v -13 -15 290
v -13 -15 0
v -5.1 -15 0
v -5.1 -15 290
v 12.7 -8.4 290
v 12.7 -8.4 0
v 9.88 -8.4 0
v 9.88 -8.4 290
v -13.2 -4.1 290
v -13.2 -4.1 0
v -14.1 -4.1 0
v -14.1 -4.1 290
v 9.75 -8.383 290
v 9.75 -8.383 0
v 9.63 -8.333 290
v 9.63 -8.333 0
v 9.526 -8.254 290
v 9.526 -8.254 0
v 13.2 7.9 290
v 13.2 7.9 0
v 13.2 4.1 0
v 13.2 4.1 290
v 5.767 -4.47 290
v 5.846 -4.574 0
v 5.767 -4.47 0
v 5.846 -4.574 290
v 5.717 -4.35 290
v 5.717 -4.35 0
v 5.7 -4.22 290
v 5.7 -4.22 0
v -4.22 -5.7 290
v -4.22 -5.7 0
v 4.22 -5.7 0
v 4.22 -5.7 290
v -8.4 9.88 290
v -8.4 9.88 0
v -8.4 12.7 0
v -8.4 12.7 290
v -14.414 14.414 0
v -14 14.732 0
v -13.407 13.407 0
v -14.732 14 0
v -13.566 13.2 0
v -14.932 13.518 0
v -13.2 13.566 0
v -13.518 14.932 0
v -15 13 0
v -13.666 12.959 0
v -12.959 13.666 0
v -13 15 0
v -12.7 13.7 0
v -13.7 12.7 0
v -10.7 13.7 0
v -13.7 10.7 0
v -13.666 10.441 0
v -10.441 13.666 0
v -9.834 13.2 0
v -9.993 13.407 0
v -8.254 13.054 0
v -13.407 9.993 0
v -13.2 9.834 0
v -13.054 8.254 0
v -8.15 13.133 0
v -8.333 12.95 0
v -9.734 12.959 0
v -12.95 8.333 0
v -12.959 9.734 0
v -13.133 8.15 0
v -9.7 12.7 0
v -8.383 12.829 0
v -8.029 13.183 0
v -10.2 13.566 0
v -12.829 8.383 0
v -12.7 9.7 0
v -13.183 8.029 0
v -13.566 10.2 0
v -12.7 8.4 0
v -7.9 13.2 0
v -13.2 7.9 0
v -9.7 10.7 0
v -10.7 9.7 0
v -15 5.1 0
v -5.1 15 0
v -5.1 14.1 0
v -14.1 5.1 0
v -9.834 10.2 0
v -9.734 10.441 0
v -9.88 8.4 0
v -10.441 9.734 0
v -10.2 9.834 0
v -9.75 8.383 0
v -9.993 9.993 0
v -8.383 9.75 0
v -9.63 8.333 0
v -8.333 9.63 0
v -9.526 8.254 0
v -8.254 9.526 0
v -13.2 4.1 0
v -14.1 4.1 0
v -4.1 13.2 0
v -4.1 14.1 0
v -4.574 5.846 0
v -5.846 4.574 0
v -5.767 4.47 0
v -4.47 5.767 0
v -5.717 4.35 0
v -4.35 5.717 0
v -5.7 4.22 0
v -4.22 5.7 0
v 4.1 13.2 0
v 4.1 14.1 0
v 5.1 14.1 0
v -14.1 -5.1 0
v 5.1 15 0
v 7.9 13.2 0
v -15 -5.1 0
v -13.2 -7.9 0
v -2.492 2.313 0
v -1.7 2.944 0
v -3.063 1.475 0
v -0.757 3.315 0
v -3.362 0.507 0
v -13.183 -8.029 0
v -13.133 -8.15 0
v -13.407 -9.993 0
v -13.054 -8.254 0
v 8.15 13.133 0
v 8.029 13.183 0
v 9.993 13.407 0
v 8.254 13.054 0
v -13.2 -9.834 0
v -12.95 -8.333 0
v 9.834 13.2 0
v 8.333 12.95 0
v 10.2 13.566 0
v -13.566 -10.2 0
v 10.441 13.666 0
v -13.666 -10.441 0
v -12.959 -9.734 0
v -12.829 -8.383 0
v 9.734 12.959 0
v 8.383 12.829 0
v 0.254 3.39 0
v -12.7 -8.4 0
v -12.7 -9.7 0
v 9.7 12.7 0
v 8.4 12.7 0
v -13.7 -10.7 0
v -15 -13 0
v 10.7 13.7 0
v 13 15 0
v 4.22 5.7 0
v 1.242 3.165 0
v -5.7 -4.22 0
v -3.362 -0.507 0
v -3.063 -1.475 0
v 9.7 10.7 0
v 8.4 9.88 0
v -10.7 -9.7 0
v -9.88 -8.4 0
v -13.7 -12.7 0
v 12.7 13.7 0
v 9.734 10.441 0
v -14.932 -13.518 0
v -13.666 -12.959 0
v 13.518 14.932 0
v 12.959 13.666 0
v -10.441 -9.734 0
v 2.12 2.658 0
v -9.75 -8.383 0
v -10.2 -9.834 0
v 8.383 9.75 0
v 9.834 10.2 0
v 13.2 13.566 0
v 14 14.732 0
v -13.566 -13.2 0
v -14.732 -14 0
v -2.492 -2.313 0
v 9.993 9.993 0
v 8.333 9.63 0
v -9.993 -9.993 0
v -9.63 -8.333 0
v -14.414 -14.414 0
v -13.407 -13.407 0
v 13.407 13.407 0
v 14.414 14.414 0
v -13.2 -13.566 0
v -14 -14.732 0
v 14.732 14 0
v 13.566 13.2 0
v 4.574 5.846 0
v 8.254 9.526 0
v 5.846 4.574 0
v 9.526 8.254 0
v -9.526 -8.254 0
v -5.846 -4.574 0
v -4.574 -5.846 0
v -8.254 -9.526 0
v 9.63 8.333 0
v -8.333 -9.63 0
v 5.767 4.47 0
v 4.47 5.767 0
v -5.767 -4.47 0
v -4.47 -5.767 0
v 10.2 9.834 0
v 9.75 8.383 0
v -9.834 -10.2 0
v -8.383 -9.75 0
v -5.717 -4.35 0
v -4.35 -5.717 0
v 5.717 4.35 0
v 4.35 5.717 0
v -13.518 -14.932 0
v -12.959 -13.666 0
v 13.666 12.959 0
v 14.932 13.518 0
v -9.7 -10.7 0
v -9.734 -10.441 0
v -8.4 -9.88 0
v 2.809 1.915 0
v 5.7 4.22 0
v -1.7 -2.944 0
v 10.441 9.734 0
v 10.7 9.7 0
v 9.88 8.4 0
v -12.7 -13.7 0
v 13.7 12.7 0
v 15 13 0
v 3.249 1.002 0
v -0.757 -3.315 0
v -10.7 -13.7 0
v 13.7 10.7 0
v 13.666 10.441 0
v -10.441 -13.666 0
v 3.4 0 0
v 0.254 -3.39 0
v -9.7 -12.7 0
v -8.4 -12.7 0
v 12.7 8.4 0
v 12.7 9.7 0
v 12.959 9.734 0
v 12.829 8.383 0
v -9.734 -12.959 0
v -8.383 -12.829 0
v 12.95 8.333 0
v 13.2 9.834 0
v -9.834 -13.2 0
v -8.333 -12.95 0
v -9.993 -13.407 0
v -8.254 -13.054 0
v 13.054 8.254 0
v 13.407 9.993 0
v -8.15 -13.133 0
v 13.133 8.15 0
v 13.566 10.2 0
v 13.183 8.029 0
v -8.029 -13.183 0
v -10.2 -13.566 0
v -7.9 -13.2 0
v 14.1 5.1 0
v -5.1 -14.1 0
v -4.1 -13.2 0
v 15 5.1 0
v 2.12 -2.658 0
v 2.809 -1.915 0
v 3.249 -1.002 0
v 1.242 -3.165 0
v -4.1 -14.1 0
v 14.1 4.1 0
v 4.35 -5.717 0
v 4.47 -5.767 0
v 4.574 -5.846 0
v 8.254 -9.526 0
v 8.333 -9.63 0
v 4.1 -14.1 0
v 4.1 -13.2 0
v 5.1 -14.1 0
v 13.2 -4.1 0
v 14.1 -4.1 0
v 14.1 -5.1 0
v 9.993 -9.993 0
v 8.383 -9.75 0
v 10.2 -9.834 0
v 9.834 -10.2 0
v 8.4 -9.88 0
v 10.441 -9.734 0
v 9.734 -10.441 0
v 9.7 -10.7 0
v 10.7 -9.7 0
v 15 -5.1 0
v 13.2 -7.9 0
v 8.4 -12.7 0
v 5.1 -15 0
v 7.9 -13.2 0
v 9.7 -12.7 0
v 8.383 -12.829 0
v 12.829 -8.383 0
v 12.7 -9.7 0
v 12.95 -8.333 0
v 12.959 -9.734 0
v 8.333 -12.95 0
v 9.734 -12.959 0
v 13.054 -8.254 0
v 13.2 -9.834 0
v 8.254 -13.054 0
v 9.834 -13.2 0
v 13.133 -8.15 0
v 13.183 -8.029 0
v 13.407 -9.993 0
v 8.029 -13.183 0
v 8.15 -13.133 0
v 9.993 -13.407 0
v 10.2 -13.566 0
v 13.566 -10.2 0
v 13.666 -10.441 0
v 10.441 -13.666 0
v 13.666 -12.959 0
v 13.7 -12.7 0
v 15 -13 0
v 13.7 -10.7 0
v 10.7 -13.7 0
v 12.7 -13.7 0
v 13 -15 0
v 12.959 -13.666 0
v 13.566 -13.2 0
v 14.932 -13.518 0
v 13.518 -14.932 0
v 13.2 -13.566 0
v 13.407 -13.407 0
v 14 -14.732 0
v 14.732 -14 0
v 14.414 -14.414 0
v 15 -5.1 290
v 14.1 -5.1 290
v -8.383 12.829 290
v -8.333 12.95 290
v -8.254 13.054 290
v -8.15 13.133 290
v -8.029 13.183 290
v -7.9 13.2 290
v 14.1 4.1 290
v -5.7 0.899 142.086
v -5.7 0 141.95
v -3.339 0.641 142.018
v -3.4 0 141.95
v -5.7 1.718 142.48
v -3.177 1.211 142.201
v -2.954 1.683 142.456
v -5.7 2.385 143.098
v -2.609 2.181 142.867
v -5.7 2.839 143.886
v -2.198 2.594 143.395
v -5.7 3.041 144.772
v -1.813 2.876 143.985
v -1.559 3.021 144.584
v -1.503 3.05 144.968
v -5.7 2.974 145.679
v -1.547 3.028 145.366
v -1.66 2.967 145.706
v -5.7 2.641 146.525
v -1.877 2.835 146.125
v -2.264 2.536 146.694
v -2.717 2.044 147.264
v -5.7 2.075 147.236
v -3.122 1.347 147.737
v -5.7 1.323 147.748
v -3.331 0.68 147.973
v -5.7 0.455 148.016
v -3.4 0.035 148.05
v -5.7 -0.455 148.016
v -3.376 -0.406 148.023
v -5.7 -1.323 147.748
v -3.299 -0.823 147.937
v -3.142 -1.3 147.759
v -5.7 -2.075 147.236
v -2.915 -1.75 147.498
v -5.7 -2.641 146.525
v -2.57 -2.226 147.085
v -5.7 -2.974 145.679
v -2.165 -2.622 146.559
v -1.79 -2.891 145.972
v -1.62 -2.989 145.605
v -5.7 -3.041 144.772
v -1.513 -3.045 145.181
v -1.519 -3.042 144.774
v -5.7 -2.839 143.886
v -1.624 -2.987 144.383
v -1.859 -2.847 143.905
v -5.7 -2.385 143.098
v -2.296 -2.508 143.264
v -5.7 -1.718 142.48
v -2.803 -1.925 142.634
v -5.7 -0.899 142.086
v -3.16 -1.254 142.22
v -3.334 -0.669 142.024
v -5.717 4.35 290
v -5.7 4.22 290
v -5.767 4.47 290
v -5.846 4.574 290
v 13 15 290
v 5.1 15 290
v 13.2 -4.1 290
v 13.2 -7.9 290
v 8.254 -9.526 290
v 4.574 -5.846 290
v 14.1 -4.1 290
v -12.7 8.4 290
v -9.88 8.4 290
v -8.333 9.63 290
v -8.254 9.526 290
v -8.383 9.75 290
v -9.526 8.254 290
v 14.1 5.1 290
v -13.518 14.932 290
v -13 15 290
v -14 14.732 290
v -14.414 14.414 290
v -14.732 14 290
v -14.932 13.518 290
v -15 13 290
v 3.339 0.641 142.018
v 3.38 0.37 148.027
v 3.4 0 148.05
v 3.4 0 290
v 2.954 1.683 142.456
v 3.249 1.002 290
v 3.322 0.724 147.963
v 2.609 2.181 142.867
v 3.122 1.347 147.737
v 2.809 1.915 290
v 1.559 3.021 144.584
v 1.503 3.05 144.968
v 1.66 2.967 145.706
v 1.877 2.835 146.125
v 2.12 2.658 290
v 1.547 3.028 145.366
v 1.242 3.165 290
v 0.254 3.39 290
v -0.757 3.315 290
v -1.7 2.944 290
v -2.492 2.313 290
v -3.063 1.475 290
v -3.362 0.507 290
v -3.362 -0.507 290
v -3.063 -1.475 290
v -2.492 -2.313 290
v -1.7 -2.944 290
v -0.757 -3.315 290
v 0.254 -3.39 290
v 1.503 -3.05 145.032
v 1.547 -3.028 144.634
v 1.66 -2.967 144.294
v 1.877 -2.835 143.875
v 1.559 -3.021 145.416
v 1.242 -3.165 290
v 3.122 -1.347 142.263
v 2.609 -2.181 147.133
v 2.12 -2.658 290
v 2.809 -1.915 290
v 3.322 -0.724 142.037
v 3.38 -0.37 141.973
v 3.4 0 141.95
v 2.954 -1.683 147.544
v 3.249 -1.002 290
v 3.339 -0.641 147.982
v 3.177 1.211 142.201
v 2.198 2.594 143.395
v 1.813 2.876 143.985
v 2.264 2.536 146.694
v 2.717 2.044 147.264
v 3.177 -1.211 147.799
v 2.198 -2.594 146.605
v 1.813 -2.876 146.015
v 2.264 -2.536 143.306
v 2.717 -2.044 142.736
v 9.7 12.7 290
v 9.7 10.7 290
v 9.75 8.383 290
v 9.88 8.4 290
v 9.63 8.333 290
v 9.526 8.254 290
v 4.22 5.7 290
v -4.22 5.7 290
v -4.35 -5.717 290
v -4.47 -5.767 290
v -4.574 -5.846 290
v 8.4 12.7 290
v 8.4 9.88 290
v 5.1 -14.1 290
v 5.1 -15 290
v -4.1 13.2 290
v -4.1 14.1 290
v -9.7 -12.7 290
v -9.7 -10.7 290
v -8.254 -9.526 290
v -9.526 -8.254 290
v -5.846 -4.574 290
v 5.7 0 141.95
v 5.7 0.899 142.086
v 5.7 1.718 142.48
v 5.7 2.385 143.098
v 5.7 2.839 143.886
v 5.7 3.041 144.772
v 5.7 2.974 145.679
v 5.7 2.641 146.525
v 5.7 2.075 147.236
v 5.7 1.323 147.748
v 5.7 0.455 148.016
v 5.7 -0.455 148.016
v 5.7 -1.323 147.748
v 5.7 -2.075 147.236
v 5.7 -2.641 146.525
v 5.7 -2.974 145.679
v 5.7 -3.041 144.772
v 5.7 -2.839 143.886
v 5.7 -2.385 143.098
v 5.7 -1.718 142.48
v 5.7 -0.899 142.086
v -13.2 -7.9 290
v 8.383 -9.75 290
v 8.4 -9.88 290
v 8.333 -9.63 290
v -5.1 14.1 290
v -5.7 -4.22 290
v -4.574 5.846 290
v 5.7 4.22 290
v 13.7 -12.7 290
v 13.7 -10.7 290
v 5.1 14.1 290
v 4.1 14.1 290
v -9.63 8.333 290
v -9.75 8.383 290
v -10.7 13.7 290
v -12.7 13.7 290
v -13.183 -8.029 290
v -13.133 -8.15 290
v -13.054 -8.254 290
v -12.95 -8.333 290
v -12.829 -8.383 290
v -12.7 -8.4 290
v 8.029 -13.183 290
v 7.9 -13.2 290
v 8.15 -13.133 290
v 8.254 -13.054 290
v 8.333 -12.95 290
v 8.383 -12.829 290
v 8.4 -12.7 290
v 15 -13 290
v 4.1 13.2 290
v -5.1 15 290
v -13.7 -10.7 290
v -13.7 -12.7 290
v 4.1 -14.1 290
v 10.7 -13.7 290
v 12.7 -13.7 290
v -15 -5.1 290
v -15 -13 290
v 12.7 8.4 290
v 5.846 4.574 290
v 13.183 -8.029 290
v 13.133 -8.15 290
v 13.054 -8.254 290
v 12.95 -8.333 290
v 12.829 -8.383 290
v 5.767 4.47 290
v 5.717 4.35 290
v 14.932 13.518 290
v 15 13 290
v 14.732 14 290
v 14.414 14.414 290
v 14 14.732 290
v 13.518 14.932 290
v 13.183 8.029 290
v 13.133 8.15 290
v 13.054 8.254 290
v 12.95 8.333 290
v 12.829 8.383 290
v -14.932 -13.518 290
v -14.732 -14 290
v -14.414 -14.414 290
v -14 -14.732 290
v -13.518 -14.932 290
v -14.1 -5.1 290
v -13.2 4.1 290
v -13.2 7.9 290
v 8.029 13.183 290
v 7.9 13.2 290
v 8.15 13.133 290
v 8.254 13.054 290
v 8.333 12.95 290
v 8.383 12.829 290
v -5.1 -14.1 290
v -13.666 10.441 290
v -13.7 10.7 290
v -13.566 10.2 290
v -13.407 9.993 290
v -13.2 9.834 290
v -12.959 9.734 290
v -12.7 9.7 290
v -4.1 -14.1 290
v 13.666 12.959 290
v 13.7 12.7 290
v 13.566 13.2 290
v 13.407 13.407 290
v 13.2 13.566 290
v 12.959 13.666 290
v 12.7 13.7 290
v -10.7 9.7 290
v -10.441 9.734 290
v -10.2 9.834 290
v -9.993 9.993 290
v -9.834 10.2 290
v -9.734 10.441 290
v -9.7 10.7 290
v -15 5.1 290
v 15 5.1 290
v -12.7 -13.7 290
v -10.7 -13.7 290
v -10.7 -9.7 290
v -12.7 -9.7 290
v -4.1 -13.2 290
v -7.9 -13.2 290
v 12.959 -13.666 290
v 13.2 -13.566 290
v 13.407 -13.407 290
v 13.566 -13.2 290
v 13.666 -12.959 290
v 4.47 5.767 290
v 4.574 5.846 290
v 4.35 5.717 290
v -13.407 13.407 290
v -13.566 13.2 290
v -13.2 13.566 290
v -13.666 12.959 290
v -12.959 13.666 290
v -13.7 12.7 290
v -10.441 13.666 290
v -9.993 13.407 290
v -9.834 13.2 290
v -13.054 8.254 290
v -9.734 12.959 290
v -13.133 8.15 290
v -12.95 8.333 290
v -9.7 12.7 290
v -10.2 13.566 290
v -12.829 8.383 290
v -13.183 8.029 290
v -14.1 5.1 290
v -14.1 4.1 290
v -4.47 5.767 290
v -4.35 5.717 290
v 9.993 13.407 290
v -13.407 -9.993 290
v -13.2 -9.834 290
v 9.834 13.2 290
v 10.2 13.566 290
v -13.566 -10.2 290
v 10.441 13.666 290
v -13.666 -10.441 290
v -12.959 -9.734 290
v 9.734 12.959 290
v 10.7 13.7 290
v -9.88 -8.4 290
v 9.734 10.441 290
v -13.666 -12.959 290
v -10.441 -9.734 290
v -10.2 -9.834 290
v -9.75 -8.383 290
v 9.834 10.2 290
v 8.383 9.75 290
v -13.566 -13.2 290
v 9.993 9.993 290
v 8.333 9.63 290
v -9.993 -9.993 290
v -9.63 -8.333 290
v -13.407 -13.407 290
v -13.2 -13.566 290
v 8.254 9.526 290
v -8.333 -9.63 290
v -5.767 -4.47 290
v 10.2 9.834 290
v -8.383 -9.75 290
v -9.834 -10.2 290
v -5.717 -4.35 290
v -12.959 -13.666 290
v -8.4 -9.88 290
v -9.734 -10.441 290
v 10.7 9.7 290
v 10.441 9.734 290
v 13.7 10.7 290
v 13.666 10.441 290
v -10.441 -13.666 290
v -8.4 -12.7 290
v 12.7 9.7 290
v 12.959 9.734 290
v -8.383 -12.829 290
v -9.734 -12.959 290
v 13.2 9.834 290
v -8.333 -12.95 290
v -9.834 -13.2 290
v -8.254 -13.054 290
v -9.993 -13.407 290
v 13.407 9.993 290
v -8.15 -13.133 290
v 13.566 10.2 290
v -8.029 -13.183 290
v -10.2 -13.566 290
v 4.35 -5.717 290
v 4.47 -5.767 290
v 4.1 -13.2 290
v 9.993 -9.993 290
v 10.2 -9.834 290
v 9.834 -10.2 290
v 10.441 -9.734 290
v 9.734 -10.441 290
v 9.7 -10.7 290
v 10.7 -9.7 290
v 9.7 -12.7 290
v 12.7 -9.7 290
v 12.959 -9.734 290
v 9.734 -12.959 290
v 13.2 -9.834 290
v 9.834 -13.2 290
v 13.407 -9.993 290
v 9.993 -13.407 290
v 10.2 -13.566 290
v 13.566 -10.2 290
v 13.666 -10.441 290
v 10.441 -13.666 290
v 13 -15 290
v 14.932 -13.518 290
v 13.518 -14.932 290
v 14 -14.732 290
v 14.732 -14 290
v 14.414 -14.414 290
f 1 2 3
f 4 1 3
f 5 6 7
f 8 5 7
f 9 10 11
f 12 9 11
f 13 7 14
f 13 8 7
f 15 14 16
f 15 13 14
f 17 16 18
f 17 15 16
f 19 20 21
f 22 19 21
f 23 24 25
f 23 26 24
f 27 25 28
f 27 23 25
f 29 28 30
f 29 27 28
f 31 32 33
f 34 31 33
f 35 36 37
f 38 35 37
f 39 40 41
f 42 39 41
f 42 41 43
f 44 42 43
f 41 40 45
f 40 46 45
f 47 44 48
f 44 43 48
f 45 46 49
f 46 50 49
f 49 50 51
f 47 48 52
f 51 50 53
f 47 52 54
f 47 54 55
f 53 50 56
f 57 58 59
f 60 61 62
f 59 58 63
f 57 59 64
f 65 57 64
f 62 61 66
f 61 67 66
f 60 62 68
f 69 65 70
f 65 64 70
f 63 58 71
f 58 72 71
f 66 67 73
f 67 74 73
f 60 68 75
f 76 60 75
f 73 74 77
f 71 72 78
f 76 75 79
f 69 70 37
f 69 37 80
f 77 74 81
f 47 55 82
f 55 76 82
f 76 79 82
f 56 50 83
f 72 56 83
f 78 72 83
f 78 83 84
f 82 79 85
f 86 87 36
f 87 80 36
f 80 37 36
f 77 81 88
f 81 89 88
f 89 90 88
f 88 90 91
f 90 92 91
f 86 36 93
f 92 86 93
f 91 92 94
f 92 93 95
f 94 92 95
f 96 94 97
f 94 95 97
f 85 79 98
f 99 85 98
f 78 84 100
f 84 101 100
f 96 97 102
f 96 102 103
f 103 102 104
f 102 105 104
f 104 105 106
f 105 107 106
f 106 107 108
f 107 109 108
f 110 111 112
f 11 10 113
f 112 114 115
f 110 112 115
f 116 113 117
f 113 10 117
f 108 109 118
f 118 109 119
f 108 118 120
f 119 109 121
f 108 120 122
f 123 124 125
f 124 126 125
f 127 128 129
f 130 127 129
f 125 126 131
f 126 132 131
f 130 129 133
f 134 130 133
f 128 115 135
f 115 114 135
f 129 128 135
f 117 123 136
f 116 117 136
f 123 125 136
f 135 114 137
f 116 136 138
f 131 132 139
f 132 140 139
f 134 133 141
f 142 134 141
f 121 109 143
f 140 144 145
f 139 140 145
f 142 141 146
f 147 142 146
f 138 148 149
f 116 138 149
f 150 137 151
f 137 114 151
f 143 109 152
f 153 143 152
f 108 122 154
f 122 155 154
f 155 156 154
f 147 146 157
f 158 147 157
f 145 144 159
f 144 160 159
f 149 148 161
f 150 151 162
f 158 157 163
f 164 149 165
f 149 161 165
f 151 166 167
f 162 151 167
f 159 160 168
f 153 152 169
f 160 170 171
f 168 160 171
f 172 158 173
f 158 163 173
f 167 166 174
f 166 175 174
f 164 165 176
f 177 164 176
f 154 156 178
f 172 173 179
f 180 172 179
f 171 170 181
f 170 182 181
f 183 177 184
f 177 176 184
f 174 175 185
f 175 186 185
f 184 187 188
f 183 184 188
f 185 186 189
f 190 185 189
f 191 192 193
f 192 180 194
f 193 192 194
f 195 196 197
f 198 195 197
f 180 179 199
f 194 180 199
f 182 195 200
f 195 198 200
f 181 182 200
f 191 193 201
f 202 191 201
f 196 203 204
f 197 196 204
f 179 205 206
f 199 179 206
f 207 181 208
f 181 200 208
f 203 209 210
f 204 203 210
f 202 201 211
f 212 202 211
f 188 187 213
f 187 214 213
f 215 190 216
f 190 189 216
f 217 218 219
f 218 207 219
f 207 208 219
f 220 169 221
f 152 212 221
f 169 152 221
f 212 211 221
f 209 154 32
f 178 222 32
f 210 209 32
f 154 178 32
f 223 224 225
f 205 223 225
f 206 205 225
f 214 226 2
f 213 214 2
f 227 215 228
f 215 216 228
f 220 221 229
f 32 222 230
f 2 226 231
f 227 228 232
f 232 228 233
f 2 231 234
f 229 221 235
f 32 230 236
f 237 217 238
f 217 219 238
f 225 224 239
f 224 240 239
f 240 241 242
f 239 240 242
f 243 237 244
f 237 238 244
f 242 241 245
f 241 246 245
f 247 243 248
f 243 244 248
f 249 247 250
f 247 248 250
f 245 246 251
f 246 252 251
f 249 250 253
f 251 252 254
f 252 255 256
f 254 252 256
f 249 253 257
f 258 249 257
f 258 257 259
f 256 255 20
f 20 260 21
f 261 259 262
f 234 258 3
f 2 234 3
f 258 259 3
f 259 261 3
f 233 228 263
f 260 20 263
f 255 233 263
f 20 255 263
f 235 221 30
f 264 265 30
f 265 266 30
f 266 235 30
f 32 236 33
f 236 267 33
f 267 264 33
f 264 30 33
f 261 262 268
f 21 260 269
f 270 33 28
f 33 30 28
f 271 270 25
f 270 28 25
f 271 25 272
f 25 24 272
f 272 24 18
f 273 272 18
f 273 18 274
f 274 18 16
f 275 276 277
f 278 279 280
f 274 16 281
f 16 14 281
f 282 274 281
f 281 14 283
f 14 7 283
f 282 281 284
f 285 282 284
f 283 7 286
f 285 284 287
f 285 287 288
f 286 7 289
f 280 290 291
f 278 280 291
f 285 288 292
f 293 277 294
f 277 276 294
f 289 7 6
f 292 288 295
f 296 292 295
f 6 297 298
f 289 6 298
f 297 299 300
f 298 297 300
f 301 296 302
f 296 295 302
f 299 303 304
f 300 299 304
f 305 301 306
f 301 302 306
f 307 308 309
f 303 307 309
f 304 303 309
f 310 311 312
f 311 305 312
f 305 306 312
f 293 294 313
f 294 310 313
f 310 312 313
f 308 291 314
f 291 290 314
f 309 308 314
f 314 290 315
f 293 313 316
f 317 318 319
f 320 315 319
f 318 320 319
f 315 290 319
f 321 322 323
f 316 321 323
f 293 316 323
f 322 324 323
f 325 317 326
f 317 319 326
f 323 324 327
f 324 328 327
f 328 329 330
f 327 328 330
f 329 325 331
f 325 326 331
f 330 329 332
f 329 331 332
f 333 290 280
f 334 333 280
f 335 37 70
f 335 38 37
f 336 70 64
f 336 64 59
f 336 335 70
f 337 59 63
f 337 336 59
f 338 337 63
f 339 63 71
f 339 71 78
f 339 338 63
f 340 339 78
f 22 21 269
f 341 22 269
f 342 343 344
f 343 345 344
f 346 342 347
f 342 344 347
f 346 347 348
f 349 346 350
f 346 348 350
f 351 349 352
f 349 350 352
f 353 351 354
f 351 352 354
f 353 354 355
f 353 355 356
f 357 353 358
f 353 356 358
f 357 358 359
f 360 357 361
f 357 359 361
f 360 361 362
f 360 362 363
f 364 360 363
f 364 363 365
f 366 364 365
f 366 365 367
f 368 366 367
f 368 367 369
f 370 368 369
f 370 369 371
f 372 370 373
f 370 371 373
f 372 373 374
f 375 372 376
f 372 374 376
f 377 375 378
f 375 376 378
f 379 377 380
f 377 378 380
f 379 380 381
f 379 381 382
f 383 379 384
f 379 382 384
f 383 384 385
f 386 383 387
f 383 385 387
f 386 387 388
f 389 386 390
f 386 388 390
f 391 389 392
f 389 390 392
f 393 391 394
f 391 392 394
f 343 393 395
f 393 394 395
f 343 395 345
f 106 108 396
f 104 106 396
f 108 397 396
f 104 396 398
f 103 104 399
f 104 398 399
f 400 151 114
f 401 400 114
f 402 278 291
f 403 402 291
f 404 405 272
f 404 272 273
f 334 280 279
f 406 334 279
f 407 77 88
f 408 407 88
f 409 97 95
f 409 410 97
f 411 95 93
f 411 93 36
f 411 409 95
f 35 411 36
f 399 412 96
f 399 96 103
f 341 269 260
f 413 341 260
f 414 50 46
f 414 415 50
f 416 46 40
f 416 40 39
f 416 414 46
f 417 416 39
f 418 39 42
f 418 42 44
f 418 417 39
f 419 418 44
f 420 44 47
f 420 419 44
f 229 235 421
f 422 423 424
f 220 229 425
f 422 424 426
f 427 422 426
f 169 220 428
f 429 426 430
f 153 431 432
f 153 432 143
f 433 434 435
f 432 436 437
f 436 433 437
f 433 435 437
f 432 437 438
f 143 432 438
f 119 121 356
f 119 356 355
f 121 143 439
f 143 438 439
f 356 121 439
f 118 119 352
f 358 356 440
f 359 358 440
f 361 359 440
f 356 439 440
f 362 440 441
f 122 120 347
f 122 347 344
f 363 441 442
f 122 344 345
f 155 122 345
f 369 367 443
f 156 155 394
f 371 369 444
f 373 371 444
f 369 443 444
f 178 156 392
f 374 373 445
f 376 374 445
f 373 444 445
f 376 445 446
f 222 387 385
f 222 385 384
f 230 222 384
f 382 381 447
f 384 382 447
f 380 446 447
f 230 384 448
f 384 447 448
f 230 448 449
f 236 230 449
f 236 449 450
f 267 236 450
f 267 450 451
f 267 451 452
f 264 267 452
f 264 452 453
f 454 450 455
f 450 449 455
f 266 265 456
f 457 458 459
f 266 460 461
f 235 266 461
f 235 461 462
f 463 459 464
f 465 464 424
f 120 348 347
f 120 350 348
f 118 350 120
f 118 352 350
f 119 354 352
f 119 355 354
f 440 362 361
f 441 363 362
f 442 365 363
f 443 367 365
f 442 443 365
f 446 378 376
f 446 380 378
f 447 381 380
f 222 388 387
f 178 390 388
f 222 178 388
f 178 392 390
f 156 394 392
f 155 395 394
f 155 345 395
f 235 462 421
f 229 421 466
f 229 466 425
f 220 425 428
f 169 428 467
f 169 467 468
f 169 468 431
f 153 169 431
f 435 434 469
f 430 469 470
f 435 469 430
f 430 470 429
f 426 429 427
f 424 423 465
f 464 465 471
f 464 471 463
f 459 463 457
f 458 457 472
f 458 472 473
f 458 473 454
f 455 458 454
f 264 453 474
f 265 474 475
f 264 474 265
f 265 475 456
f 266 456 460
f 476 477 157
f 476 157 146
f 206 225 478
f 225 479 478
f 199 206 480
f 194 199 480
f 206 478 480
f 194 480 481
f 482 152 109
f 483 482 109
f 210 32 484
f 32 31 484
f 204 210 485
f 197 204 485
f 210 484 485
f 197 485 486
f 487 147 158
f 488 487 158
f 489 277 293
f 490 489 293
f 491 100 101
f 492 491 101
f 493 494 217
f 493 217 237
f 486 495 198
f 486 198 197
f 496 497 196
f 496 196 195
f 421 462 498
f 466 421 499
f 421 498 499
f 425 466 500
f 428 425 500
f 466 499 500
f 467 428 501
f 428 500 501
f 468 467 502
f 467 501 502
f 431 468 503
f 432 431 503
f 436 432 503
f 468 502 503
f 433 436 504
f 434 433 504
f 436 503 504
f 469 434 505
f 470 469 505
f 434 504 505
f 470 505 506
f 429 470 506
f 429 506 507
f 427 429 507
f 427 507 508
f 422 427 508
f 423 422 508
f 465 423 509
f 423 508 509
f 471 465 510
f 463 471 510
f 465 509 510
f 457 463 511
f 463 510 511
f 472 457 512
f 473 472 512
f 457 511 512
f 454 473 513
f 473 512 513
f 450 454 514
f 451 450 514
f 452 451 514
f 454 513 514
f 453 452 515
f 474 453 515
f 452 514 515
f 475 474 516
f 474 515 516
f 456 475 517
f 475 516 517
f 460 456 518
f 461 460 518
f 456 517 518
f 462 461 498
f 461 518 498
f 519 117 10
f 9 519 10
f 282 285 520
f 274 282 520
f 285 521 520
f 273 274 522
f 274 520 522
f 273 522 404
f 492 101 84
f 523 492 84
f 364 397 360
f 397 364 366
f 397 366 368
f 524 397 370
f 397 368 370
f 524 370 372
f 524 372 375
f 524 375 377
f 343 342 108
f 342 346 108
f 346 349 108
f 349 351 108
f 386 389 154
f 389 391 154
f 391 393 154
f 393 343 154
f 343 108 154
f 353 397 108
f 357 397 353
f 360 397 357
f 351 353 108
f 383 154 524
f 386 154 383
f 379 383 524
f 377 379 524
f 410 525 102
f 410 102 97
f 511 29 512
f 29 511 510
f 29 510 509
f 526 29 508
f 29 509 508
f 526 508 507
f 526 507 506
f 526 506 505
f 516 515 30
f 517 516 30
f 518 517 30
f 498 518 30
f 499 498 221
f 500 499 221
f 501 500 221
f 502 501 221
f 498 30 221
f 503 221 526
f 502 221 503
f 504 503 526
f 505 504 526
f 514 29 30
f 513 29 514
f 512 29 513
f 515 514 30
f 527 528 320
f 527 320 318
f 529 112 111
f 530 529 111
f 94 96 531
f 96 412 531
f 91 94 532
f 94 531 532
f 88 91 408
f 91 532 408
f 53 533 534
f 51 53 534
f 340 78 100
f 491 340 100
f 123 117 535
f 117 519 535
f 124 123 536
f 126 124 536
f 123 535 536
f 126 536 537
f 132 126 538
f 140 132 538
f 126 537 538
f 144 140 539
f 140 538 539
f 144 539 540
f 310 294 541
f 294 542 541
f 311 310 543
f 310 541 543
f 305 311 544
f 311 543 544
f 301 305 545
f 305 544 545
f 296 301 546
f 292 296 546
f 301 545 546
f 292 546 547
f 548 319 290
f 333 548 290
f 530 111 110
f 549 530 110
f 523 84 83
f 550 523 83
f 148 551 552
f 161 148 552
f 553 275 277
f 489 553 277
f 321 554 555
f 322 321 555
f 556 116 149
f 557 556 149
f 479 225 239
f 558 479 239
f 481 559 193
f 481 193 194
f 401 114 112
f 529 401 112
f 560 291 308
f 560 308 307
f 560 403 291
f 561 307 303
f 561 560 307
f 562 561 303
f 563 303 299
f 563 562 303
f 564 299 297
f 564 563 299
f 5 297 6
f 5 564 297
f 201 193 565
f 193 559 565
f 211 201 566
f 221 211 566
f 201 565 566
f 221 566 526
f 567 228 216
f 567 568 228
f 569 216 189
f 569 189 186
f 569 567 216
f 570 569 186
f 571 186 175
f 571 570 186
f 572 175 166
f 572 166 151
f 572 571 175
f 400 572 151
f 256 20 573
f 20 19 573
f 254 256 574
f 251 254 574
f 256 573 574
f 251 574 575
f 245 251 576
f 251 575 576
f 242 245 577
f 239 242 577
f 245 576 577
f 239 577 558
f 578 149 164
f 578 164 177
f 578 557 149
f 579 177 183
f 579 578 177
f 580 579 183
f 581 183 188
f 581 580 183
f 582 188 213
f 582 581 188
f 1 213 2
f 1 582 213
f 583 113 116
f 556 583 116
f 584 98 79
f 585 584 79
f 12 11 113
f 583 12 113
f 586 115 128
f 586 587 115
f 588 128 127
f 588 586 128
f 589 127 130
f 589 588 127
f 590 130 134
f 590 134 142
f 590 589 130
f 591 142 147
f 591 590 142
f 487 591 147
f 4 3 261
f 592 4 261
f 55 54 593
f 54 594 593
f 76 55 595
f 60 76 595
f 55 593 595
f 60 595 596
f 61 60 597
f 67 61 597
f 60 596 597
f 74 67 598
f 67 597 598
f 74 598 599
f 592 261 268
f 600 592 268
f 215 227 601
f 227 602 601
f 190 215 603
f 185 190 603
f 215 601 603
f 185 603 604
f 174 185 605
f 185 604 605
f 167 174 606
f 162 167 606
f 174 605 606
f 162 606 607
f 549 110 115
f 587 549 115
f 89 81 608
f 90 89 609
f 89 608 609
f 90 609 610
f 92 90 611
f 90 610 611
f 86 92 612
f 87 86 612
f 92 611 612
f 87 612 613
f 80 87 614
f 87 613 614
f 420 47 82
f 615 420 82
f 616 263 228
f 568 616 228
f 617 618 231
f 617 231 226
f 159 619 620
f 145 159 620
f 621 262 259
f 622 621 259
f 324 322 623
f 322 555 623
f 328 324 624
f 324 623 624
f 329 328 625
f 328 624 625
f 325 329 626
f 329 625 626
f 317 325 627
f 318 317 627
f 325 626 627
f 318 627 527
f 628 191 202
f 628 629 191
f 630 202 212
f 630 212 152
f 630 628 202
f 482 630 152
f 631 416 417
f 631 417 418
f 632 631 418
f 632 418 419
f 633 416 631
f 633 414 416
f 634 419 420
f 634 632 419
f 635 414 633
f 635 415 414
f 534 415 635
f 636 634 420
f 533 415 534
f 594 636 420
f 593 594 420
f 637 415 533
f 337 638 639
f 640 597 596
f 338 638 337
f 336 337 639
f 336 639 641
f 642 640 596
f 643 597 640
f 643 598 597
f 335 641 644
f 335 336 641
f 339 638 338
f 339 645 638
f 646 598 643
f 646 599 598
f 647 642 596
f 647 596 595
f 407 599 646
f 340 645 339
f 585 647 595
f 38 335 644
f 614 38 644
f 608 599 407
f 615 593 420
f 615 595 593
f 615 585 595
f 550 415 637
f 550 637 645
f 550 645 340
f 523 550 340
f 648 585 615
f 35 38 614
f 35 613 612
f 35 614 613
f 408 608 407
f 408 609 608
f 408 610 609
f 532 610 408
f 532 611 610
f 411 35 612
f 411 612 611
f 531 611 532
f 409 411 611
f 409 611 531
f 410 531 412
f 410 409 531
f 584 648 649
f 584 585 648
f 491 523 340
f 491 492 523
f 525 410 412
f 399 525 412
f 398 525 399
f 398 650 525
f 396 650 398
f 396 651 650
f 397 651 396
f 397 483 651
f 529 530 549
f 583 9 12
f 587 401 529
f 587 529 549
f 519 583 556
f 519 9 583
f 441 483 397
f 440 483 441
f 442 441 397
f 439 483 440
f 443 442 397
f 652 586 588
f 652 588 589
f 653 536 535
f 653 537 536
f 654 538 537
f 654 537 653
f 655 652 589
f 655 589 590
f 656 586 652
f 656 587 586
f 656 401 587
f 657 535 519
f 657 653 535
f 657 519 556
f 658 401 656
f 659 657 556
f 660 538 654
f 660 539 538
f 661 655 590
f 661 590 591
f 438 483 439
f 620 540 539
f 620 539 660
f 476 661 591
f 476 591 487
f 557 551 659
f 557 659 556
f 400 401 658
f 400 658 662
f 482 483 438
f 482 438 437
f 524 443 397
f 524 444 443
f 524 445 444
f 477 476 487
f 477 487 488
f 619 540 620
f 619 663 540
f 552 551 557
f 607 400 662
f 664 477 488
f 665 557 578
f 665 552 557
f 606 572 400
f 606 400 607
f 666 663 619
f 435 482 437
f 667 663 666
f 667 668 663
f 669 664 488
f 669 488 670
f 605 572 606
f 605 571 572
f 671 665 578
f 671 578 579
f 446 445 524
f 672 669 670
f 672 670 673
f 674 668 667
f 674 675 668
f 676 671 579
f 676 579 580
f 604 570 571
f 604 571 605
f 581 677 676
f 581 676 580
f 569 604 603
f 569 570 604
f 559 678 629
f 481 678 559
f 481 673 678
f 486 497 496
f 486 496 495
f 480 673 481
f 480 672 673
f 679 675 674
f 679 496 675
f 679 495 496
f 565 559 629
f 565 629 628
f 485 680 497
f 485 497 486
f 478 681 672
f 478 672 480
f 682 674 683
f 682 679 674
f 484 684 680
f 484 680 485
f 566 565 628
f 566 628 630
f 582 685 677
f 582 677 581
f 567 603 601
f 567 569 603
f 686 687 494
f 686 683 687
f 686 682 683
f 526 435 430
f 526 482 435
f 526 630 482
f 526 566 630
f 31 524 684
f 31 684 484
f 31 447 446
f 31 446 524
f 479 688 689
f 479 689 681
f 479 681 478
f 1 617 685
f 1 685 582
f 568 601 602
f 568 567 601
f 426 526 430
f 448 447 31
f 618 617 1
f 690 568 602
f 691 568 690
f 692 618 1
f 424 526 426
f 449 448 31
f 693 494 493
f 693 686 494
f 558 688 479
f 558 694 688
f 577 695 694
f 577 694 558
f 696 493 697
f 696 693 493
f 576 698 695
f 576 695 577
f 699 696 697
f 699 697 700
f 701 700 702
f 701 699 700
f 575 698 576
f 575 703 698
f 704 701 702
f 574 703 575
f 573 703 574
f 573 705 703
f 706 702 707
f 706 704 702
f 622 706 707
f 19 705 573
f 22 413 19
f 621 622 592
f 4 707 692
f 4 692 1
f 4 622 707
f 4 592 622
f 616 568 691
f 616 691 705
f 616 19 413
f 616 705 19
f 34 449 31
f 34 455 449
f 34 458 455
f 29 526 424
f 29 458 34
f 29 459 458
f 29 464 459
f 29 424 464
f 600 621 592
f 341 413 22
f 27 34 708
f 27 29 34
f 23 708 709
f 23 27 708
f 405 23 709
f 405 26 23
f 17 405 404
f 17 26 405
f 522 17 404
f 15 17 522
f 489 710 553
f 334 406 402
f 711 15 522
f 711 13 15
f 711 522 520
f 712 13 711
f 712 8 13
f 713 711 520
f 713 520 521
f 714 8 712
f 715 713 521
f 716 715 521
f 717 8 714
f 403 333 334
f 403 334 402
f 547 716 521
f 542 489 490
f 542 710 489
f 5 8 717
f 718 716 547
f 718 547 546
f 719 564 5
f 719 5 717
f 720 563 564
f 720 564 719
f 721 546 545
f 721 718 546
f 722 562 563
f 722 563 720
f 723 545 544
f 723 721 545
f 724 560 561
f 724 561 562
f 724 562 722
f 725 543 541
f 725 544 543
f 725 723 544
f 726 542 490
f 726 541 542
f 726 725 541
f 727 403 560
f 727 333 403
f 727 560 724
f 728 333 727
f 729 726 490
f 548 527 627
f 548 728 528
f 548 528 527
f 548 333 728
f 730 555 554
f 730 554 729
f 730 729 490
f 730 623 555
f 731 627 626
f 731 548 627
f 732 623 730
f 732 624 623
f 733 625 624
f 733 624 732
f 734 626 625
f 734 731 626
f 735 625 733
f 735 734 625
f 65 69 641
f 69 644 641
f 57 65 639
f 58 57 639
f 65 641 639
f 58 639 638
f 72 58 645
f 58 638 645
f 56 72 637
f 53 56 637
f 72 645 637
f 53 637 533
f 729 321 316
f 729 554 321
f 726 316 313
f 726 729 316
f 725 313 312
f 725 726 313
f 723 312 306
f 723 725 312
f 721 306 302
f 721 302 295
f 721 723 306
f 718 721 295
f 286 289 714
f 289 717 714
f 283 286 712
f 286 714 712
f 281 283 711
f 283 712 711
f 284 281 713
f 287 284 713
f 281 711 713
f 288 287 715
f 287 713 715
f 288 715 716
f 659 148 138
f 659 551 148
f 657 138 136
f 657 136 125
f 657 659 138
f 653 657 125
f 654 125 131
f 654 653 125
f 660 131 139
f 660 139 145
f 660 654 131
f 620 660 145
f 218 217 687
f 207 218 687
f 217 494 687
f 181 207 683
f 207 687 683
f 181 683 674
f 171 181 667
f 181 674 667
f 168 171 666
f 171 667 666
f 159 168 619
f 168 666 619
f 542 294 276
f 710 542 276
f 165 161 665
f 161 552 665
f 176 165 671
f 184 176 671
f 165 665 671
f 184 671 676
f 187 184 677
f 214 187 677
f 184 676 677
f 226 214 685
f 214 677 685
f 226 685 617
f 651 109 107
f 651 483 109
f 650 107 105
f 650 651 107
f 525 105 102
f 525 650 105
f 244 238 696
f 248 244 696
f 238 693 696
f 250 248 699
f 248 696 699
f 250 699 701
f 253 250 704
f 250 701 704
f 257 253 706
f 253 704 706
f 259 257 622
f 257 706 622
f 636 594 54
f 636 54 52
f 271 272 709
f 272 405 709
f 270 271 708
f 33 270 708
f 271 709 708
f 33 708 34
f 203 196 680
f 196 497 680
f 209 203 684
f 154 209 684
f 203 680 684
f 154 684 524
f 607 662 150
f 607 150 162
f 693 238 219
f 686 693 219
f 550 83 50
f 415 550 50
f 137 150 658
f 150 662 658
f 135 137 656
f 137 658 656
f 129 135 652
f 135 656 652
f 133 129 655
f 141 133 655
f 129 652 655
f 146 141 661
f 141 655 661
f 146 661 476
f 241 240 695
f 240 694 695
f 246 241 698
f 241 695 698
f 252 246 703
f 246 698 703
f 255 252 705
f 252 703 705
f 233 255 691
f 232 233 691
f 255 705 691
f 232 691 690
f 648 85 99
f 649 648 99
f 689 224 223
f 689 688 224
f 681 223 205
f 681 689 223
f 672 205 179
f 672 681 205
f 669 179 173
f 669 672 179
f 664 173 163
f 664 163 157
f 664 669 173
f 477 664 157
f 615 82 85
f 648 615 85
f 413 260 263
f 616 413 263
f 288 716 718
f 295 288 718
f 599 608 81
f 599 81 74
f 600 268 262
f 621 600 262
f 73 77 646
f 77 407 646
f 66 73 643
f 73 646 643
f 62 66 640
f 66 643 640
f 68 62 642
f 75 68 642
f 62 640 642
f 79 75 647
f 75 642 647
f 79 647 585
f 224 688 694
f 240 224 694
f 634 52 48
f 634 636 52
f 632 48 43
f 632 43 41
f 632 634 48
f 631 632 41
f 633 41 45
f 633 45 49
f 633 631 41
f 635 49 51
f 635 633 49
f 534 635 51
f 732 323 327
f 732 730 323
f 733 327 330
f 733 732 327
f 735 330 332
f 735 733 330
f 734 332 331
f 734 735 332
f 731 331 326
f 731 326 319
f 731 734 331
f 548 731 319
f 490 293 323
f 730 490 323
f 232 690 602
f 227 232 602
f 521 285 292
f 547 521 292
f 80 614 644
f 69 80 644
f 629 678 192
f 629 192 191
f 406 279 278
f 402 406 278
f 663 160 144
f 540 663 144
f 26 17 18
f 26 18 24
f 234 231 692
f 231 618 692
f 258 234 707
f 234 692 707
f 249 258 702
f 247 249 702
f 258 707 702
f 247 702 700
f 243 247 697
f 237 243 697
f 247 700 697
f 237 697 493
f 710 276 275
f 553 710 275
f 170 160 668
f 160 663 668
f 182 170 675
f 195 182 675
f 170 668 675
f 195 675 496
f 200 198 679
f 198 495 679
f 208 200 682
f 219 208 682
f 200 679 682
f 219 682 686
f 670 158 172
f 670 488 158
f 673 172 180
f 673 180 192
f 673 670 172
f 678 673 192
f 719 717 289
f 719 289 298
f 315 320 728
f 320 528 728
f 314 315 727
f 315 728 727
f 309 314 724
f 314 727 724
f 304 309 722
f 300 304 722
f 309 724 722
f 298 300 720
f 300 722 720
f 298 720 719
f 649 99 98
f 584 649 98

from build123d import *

# Parameters (mm, degrees)
SKETCH_1_W                       = 4
SKETCH_1_H                       = 4
EXTRUDE_1_DEPTH                  = 290
FILLET_1_R                       = 1
FILLET_2_R                       = 2
FILLET_3_R                       = 0.5
PATTERN_CIRCULAR_1_COUNT         = 4
FILLET_1_OF_PATTERN_CIRCULAR_1_R = 1
FILLET_2_OF_PATTERN_CIRCULAR_1_R = 2
FILLET_3_OF_PATTERN_CIRCULAR_1_R = 0.5
SKETCH_2_R                       = 3.4
CUT_EXTRUDE_1_DEPTH              = 291
SKETCH_3_R                       = 3.05
CUT_EXTRUDE_2_DEPTH              = 10


with BuildPart() as part:
    # 草图1 → 凸台-拉伸1 (new body)
    with BuildSketch(Plane.XY):
        Polygon((5.7, 0), (5.7, 4.427207794), (9.672792206, 8.4), (13.2, 8.4), (13.2, 4.1), (14.1, 4.1), (14.1, 5.1), (15, 5.1), (15, 15), (5.1, 15), (5.1, 14.1), (4.1, 14.1), (4.1, 13.2), (8.4, 13.2), (8.4, 9.672792206), (4.427207794, 5.7), (0, 5.7), (0, 0), align=None)
        with Locations((11.7, 11.7)):
            Rectangle(SKETCH_1_W, SKETCH_1_H, mode=Mode.SUBTRACT)
    extrude_1 = extrude(amount=EXTRUDE_1_DEPTH)

    # 圆角1
    fillet_1_edges = [part.edges().sort_by_distance(p)[0] for p in [
        (13.7, 9.7, 145),
        (13.7, 13.7, 145),
        (9.7, 13.7, 145),
        (9.7, 9.7, 145),
    ]]
    fillet(fillet_1_edges, radius=FILLET_1_R)

    # 圆角2
    fillet_2_edges = [part.edges().sort_by_distance(p)[0] for p in [
        (15, 15, 145),
    ]]
    fillet(fillet_2_edges, radius=FILLET_2_R)

    # 圆角3
    fillet_3_edges = [part.edges().sort_by_distance(p)[0] for p in [
        (4.427207794, 5.7, 145),
        (8.4, 9.672792206, 145),
        (8.4, 13.2, 145),
        (13.2, 8.4, 145),
        (9.672792206, 8.4, 145),
        (5.7, 4.427207794, 145),
    ]]
    fillet(fillet_3_edges, radius=FILLET_3_R)

    # 阵列(圆周)1: 凸台-拉伸1 ×4 about axis
    pattern_circular_1_axis = Axis((0, 0, 0), (0, 0, 1))
    for i in range(1, PATTERN_CIRCULAR_1_COUNT):
        add(extrude_1.rotate(pattern_circular_1_axis, i * 360 / PATTERN_CIRCULAR_1_COUNT))

    # 圆角1 of 阵列(圆周)1
    fillet_1_of_pattern_circular_1_edges = [part.edges().sort_by_distance(p)[0] for p in [
        (-9.7, 13.7, 145),
        (-13.7, 13.7, 145),
        (-13.7, 9.7, 145),
        (-9.7, 9.7, 145),
        (-13.7, -9.7, 145),
        (-13.7, -13.7, 145),
        (-9.7, -13.7, 145),
        (-9.7, -9.7, 145),
        (9.7, -13.7, 145),
        (13.7, -13.7, 145),
        (13.7, -9.7, 145),
        (9.7, -9.7, 145),
    ]]
    fillet(fillet_1_of_pattern_circular_1_edges, radius=FILLET_1_OF_PATTERN_CIRCULAR_1_R)

    # 圆角2 of 阵列(圆周)1
    fillet_2_of_pattern_circular_1_edges = [part.edges().sort_by_distance(p)[0] for p in [
        (-15, 15, 145),
        (-15, -15, 145),
        (15, -15, 145),
    ]]
    fillet(fillet_2_of_pattern_circular_1_edges, radius=FILLET_2_OF_PATTERN_CIRCULAR_1_R)

    # 圆角3 of 阵列(圆周)1
    fillet_3_of_pattern_circular_1_edges = [part.edges().sort_by_distance(p)[0] for p in [
        (-5.7, 4.427207794, 145),
        (-9.672792206, 8.4, 145),
        (-13.2, 8.4, 145),
        (-8.4, 13.2, 145),
        (-8.4, 9.672792206, 145),
        (-4.427207794, 5.7, 145),
        (-4.427207794, -5.7, 145),
        (-8.4, -9.672792206, 145),
        (-8.4, -13.2, 145),
        (-13.2, -8.4, 145),
        (-9.672792206, -8.4, 145),
        (-5.7, -4.427207794, 145),
        (5.7, -4.427207794, 145),
        (9.672792206, -8.4, 145),
        (13.2, -8.4, 145),
        (8.4, -13.2, 145),
        (8.4, -9.672792206, 145),
        (4.427207794, -5.7, 145),
    ]]
    fillet(fillet_3_of_pattern_circular_1_edges, radius=FILLET_3_OF_PATTERN_CIRCULAR_1_R)

    # 草图2 → 切除-拉伸1 (cut, through all)
    with BuildSketch(Plane.XY.offset(290)):
        Circle(SKETCH_2_R)
    extrude(amount=-CUT_EXTRUDE_1_DEPTH, mode=Mode.SUBTRACT)

    # 草图3 → 切除-拉伸2 (cut, symmetric)
    with BuildSketch(Plane(origin=(0, 0, 0), x_dir=(0, 0, -1), z_dir=(1, 0, 0))):
        with Locations((-145, 0)):
            Circle(SKETCH_3_R)
    extrude(amount=CUT_EXTRUDE_2_DEPTH, both=True, mode=Mode.SUBTRACT)


solid = part.part
